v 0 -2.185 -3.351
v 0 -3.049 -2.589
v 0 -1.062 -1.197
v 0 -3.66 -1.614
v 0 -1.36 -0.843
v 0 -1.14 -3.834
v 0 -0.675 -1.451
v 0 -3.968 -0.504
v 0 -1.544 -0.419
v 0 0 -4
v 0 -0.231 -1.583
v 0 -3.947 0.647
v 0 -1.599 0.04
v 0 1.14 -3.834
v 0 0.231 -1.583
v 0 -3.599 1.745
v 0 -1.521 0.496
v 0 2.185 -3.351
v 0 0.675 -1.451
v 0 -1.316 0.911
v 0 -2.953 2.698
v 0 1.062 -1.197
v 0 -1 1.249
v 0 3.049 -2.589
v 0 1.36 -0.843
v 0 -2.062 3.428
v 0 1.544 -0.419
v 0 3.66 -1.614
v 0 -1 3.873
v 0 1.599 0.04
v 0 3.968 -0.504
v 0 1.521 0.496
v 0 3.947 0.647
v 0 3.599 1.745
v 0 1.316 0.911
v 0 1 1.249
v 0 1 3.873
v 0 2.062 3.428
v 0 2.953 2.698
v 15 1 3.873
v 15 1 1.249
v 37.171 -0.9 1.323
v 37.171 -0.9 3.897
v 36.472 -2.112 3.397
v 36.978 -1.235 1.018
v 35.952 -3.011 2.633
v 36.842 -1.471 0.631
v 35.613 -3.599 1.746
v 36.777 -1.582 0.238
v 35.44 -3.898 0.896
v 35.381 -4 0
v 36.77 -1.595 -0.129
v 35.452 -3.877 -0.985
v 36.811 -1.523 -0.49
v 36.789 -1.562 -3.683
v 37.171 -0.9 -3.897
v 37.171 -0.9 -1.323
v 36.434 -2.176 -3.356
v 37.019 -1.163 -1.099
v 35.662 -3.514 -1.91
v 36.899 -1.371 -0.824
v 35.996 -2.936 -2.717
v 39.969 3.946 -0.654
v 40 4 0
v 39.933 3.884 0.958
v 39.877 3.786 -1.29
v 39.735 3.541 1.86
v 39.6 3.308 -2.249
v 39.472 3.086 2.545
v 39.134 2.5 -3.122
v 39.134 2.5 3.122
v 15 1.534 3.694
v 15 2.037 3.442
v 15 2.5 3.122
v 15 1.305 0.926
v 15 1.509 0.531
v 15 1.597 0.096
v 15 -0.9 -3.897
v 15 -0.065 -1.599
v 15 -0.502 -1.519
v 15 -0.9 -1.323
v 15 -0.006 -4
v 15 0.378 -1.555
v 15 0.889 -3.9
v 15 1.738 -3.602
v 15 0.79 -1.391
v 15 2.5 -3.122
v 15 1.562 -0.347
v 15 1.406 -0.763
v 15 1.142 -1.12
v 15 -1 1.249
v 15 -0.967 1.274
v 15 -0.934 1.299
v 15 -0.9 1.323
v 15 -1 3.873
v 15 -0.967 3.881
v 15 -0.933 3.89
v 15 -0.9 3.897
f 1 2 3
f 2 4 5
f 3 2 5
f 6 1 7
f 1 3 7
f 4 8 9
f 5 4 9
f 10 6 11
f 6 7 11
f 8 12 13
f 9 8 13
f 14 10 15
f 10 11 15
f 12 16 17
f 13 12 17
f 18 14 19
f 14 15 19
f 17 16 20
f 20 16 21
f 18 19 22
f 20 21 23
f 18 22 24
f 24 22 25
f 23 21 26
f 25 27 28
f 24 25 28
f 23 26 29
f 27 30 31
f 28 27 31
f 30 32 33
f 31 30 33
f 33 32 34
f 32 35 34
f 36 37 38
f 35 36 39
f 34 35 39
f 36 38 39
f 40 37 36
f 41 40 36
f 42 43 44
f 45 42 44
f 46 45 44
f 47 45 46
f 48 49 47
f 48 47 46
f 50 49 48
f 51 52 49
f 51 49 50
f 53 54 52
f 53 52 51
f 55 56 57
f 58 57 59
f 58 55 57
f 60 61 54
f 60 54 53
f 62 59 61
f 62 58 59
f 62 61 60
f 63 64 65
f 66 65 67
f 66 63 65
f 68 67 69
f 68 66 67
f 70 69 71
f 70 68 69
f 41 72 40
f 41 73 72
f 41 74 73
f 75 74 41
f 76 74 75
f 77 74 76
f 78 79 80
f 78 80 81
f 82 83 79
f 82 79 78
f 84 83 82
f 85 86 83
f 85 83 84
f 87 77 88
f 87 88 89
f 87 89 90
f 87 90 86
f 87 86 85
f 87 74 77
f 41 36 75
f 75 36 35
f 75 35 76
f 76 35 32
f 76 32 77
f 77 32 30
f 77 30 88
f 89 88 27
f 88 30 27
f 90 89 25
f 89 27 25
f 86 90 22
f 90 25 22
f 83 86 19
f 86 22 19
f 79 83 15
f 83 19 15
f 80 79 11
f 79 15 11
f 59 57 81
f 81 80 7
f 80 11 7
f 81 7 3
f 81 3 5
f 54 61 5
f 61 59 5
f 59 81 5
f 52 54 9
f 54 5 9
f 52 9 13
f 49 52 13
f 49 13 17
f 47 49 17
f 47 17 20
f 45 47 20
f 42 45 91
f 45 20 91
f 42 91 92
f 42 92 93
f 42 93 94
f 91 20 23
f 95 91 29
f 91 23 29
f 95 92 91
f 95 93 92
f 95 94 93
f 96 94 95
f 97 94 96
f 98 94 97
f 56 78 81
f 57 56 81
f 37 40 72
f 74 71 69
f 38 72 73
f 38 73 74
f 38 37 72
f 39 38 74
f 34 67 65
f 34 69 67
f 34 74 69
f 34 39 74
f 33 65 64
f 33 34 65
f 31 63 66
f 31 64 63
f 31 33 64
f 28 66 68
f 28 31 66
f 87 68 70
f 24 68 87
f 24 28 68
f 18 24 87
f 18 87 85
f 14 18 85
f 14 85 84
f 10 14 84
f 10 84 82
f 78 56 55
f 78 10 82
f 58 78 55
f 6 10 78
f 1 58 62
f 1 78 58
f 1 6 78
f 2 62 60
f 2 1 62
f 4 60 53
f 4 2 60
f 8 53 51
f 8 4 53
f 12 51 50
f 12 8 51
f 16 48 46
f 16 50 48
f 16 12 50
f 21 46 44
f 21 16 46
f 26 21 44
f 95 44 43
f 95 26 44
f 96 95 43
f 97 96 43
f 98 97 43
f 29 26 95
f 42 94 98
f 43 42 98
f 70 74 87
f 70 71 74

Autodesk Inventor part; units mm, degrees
ref_plane "YZ Plane" through (0, 0, 0) normal (1, 0, 0) x (0, 1, 0)
ref_plane "XZ Plane" through (0, 0, 0) normal (0, 1, 0) x (-1, 0, 0)
ref_plane "XY Plane" through (0, 0, 0) normal (0, 0, 1) x (1, 0, 0)
sketch "Sketch1" plane through (0, 0, 0) normal (1, 0, 0) x (0, 1, 0)
  circle A0 centre (0, 0) radius 4
  dimension "d0" = 8
extrude "Extrusion1" add sketch "Sketch1" along normal blind 40
sketch "Sketch2" plane through (40, 0, 0) normal (1, 0, 0) x (0, 0, -1)
  line L0 (-4, 2.5) -> (4, 2.5)
  line L1 (4, 2.5) -> (4, -0.9)
  line L2 (4, -0.9) -> (-4, -0.9)
  line L3 (-4, -0.9) -> (-4, 2.5)
  point P0 (0, 0)
  dimension "d3" = 8
  dimension "d4" = 3.4
  dimension "d5" = 2.5
  dimension "d6" = 4
extrude "Extrusion2" cut sketch "Sketch2" against normal blind 25
sketch "Sketch3" plane through (0, 0, 0) normal (-1, 0, 0) x (0, 0, 1)
  circle A0 centre (0, 0) radius 1.6
  dimension "d9" = 3.2
extrude "Extrusion3" cut sketch "Sketch3" against normal through all
sketch "Sketch4" plane through (0, 0, 0) normal (0, 0, 1) x (1, 0, 0)
  line L0 (40, 2.5) -> (40, 4) projected
  line L1 (40, 4) -> (35.3812, -4)
  line L2 (0, -4) -> (40, -4) projected
  line L3 (40, 4) -> (49.2376, 4) construction
  line L4 (35.3812, -4) -> (40, -4)
  line L5 (40, 4) -> (40, -4)
  point P0 (0, 0)
  dimension "d12" = 120
extrude "Extrusion4" cut sketch "Sketch4" along normal through all both and the other way through all
sketch "Sketch6" plane through (0, 0, 0) normal (-1, 0, 0) x (0, 0, 1)
  line L0 (4, 1) -> (1.2, 1)
  line L1 (1.2, 1) -> (1.2, -1)
  line L2 (1.2, -1) -> (4, -1)
  line L3 (4, -1) -> (4, 1)
  point P0 (0, 0)
  dimension "d23" = 2
  dimension "d24" = 4
  dimension "d25" = 1
  dimension "d27" = 1.2
extrude "Extrusion6" cut sketch "Sketch6" against normal up to surface (15 mm away)
equation "\"d6\" = 0.5 * d3"
equation "\"d25\" = 0.5 * d23"
properties part number "Main_tip_coupler"
